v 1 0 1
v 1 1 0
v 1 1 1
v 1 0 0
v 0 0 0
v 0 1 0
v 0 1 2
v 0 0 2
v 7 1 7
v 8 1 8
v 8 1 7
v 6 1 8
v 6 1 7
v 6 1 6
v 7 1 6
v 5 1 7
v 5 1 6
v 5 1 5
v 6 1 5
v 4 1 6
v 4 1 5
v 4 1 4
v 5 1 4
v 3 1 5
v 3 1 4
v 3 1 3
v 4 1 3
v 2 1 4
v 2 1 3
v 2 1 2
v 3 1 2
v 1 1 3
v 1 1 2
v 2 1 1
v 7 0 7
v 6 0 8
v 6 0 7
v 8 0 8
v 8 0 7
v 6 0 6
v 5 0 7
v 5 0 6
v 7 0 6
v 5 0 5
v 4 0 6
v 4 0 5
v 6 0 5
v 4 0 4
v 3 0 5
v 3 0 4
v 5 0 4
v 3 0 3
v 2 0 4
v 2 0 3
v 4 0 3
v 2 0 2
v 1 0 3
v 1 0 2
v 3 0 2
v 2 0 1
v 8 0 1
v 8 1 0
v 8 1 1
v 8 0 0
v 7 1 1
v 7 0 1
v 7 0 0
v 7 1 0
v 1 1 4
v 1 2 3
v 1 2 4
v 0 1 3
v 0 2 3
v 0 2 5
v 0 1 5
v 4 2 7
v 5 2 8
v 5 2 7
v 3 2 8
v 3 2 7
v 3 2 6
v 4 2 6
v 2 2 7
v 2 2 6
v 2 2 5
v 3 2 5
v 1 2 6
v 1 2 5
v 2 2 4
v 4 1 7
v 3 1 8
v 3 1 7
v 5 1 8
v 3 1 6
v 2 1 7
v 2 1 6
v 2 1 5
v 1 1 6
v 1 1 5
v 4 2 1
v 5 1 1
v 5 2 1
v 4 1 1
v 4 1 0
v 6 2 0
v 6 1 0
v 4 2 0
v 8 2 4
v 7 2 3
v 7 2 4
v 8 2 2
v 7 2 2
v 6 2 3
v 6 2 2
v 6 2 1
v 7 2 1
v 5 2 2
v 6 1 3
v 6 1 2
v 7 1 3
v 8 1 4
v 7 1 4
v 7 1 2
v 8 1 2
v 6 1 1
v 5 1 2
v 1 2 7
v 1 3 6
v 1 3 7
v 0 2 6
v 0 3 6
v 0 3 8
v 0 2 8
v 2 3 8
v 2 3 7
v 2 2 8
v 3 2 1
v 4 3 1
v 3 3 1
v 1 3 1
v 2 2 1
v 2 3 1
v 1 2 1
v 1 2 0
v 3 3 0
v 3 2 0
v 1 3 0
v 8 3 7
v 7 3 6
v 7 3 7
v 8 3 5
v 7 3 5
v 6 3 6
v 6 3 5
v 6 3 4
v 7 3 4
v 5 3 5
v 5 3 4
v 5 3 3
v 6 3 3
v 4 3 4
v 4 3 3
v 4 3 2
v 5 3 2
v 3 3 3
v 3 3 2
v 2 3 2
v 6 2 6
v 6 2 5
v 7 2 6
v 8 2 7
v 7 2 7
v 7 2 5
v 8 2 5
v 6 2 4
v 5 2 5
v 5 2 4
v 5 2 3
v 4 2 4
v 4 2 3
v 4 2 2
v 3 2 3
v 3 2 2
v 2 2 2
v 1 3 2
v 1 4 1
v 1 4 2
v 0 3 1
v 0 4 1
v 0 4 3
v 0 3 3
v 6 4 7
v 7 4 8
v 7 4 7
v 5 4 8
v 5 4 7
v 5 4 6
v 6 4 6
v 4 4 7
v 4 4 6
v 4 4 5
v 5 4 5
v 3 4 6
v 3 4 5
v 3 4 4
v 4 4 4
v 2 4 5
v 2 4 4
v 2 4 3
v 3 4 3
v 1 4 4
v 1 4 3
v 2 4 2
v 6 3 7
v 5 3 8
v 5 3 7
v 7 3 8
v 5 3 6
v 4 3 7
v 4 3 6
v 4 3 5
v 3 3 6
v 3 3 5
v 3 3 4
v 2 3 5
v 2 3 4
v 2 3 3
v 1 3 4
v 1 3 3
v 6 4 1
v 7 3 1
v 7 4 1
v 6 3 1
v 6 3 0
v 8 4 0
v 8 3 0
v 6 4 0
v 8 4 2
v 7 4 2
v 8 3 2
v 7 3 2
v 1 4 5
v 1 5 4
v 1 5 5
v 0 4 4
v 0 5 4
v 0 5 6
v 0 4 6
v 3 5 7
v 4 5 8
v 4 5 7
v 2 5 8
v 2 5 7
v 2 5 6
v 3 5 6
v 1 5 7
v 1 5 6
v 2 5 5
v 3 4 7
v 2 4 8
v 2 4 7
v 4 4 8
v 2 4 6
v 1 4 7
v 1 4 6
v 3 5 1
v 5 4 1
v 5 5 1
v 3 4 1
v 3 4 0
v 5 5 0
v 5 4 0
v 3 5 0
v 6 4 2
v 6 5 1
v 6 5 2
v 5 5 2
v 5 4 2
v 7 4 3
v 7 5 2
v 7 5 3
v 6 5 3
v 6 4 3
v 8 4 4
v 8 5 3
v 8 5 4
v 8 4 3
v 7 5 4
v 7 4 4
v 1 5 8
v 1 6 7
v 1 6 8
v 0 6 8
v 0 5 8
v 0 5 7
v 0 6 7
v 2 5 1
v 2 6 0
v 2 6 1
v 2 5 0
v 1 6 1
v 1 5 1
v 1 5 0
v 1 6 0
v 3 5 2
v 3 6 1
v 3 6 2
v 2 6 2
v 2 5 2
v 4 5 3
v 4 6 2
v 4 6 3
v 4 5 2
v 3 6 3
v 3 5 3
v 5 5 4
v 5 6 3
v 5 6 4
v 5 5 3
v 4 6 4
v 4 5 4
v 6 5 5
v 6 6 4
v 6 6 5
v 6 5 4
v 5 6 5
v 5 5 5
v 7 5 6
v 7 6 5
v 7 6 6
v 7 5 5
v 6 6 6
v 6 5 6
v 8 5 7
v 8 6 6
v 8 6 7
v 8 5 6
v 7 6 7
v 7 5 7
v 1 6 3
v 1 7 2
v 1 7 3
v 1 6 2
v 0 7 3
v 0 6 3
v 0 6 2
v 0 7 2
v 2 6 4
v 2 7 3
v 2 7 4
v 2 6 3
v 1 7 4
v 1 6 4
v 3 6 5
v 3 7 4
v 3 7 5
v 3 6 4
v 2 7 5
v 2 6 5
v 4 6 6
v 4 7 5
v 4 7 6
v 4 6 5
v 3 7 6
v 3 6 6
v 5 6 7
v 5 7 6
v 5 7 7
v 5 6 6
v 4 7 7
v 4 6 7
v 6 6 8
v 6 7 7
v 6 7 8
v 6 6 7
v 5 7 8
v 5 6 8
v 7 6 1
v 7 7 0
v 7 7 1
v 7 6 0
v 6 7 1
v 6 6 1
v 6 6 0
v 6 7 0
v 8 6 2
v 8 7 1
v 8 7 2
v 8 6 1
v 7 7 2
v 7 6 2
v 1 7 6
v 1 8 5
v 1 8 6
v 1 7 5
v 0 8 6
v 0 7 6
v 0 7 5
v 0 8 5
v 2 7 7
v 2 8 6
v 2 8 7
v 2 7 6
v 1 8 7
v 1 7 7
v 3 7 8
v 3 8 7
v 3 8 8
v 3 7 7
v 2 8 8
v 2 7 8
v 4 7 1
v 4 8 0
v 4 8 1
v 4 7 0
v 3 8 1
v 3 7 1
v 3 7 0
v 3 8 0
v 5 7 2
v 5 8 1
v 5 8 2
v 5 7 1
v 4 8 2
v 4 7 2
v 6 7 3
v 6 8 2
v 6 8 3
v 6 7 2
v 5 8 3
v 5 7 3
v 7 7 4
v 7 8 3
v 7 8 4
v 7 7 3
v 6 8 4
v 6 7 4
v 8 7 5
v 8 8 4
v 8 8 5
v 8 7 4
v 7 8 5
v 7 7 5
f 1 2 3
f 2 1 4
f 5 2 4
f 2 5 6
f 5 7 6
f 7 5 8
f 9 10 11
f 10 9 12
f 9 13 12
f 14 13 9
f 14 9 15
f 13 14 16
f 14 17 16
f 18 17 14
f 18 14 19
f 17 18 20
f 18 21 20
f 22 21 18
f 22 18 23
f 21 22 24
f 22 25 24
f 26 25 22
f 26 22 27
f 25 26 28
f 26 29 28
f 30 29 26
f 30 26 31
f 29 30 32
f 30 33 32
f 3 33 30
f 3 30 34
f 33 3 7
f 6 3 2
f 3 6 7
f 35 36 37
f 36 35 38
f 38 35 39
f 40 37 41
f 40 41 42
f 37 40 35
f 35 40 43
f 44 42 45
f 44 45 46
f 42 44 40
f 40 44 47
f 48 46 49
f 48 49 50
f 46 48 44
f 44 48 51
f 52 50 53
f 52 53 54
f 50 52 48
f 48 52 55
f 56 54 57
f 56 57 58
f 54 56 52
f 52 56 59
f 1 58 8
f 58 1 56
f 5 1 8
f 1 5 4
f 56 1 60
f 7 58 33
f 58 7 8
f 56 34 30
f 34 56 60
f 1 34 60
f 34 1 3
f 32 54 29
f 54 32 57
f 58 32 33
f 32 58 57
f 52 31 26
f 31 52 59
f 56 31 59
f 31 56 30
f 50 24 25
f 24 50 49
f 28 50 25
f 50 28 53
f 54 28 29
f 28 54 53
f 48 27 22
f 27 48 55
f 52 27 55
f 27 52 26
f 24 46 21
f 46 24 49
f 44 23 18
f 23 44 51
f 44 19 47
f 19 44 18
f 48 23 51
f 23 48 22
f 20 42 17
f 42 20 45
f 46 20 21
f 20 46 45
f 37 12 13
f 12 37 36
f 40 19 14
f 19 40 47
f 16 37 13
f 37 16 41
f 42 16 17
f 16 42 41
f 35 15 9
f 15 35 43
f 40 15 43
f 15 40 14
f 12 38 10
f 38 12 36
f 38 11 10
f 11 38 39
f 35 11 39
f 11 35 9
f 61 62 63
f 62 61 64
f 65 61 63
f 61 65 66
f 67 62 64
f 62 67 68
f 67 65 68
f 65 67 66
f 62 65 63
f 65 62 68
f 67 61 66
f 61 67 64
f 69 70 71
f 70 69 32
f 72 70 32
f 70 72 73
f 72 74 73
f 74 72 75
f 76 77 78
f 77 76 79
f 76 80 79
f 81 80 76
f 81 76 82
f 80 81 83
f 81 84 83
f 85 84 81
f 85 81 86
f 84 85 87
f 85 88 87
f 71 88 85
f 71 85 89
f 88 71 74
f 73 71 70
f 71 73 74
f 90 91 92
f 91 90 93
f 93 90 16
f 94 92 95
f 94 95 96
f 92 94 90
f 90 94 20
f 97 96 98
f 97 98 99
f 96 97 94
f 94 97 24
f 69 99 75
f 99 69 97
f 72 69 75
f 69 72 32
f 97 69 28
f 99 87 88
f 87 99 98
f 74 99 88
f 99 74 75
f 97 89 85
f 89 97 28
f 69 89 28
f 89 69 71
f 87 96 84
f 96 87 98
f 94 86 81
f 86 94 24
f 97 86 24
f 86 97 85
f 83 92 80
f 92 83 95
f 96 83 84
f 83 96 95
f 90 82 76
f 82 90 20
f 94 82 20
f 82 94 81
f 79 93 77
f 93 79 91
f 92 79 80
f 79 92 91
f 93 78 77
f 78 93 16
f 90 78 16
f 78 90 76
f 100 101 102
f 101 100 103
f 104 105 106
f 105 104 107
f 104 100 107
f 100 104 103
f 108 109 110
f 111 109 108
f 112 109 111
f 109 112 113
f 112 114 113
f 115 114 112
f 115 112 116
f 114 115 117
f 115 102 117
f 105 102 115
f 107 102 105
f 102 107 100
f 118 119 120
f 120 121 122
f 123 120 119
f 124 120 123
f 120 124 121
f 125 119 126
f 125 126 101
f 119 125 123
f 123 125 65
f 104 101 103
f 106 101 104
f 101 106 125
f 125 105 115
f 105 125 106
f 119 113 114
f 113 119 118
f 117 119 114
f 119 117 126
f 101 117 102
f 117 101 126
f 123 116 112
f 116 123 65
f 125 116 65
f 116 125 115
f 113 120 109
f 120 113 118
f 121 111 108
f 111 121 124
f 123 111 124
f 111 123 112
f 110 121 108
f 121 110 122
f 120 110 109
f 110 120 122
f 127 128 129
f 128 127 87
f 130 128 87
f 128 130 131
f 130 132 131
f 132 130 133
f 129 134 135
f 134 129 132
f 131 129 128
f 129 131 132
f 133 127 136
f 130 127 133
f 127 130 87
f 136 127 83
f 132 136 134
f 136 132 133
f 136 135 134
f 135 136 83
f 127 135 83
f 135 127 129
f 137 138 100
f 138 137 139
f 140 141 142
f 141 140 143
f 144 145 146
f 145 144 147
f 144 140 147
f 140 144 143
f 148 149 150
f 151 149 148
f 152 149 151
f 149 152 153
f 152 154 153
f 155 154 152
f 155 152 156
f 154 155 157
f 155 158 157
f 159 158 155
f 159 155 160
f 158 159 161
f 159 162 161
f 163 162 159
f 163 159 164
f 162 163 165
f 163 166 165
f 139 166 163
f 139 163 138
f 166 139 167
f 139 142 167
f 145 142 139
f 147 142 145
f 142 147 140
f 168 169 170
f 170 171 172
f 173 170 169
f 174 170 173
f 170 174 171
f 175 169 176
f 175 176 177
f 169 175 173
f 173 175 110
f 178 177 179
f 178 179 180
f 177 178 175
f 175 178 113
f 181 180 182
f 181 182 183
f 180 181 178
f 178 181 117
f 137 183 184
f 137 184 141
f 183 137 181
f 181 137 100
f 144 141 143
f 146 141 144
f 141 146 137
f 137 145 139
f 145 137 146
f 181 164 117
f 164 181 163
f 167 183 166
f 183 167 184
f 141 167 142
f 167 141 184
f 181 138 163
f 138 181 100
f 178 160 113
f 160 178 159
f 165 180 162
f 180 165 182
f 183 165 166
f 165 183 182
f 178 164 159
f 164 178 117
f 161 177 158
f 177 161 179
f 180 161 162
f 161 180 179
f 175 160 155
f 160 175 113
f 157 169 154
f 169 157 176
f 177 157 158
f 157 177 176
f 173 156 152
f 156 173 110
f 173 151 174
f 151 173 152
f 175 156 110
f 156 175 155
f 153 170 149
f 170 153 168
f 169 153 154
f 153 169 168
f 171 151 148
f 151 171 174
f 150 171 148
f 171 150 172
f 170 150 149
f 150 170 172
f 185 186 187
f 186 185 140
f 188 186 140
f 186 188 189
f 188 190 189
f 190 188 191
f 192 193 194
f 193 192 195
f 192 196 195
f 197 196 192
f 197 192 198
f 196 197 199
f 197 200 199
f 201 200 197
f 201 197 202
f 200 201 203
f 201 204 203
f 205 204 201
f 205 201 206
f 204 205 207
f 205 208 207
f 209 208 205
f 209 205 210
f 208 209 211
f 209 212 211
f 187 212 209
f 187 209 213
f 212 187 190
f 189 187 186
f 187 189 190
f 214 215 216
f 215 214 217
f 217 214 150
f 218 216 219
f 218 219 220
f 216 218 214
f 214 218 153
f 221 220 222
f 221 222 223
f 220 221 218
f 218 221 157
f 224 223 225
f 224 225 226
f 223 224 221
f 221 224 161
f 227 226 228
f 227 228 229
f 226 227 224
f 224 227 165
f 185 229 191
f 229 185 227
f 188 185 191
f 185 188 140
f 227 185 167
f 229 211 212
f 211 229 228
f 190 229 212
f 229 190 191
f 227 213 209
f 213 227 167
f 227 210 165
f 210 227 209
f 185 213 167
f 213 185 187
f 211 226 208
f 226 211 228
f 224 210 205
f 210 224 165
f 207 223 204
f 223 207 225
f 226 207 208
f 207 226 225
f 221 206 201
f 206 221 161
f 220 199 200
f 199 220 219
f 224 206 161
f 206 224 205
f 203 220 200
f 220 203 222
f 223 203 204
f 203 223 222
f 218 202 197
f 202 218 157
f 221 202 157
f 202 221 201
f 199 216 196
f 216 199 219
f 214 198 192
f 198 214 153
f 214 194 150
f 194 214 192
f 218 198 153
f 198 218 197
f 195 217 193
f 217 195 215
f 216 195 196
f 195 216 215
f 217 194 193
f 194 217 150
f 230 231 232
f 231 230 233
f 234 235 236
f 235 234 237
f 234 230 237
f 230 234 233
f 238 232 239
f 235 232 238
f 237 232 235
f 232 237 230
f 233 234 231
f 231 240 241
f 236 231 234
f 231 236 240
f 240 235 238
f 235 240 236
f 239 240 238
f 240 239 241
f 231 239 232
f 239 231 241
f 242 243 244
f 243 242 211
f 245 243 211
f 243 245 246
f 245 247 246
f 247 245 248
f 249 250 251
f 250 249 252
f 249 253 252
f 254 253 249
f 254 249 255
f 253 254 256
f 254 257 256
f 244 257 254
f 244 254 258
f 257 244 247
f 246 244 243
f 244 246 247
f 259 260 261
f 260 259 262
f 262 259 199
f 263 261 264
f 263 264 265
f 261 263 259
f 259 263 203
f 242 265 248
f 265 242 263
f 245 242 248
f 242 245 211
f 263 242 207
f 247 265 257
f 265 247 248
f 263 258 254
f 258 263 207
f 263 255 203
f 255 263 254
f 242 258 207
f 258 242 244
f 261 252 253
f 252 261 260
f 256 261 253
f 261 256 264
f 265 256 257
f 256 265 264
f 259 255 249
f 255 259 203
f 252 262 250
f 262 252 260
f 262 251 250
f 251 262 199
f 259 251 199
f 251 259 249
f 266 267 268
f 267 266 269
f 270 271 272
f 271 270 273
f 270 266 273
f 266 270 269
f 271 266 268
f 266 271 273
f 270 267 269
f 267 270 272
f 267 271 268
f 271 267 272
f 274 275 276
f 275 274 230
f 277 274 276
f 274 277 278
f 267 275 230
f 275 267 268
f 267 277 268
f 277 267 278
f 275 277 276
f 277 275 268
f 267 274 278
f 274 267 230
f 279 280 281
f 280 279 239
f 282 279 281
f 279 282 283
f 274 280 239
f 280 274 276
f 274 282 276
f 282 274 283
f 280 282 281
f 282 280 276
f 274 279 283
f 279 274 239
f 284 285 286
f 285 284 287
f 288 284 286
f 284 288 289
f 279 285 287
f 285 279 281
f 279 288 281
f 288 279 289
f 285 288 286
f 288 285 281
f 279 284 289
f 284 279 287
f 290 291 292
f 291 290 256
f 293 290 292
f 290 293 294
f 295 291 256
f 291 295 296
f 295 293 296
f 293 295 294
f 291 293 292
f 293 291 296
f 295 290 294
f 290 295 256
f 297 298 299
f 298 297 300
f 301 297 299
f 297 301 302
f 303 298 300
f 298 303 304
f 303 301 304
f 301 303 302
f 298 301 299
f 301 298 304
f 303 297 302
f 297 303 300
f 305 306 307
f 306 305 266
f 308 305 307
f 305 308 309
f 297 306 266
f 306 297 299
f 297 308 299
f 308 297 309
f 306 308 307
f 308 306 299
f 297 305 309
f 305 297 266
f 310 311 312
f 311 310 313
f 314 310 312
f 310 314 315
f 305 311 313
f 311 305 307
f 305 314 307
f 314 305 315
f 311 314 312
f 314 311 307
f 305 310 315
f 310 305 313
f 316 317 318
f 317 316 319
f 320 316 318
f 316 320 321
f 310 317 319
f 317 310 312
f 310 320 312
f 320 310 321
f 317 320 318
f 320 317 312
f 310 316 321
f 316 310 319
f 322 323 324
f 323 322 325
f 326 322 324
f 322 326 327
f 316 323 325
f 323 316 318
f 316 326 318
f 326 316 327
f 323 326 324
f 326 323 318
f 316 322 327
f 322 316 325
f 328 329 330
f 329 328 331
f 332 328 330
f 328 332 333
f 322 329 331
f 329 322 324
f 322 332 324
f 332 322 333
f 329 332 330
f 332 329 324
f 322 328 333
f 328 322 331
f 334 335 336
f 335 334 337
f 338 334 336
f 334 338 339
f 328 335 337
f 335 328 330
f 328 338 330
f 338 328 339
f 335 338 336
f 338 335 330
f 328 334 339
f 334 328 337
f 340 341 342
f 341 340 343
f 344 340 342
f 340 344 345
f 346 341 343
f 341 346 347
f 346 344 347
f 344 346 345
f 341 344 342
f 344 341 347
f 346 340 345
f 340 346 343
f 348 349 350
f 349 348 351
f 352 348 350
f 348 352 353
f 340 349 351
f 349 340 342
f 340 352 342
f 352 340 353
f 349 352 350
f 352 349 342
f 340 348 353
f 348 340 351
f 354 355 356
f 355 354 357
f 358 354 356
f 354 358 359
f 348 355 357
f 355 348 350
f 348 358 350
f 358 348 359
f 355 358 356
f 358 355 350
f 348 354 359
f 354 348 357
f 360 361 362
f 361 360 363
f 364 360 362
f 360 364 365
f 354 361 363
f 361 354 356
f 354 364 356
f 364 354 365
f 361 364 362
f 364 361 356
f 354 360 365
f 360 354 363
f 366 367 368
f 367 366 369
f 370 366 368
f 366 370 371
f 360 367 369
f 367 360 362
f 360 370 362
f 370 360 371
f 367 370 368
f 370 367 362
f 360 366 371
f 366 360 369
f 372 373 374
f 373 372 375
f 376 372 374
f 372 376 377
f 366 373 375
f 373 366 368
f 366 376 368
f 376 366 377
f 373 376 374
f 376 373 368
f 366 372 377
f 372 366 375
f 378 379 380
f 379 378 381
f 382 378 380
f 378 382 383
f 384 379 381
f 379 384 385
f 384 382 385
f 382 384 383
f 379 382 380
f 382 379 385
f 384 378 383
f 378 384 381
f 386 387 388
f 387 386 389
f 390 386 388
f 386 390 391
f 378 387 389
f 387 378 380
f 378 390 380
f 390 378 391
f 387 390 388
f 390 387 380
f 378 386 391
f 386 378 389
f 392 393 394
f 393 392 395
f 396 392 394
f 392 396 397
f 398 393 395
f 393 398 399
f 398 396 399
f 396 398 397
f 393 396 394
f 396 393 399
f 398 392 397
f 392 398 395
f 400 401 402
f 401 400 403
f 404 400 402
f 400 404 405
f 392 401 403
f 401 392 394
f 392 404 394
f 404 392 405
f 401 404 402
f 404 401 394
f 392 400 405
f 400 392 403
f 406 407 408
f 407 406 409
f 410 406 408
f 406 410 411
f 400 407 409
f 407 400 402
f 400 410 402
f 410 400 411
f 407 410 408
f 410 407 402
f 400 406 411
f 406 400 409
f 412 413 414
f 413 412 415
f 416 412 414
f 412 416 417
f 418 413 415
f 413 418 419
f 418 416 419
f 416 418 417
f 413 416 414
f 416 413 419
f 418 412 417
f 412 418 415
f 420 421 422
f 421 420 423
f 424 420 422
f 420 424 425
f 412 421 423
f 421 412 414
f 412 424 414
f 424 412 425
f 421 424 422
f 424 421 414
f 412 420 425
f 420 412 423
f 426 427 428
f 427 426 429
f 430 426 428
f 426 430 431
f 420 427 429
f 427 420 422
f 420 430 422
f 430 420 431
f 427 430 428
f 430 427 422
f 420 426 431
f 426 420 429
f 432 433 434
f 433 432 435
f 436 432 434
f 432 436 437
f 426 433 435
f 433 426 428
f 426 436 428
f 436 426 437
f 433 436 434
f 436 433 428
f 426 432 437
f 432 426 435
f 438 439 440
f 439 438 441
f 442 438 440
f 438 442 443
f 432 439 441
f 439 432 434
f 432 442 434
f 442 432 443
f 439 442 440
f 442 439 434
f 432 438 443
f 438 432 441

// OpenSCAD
union() {
    translate([0, 0, 0]) cube([1, 1, 1]);
    translate([0, 0, 1]) cube([1, 1, 1]);
    translate([1, 0, 1]) cube([1, 1, 1]);
    translate([1, 0, 2]) cube([1, 1, 1]);
    translate([2, 0, 2]) cube([1, 1, 1]);
    translate([2, 0, 3]) cube([1, 1, 1]);
    translate([3, 0, 3]) cube([1, 1, 1]);
    translate([3, 0, 4]) cube([1, 1, 1]);
    translate([4, 0, 4]) cube([1, 1, 1]);
    translate([4, 0, 5]) cube([1, 1, 1]);
    translate([5, 0, 5]) cube([1, 1, 1]);
    translate([5, 0, 6]) cube([1, 1, 1]);
    translate([6, 0, 6]) cube([1, 1, 1]);
    translate([6, 0, 7]) cube([1, 1, 1]);
    translate([7, 0, 7]) cube([1, 1, 1]);
    translate([7, 0, 0]) cube([1, 1, 1]);
    translate([0, 1, 3]) cube([1, 1, 1]);
    translate([0, 1, 4]) cube([1, 1, 1]);
    translate([1, 1, 4]) cube([1, 1, 1]);
    translate([1, 1, 5]) cube([1, 1, 1]);
    translate([2, 1, 5]) cube([1, 1, 1]);
    translate([2, 1, 6]) cube([1, 1, 1]);
    translate([3, 1, 6]) cube([1, 1, 1]);
    translate([3, 1, 7]) cube([1, 1, 1]);
    translate([4, 1, 7]) cube([1, 1, 1]);
    translate([4, 1, 0]) cube([1, 1, 1]);
    translate([5, 1, 0]) cube([1, 1, 1]);
    translate([5, 1, 1]) cube([1, 1, 1]);
    translate([6, 1, 1]) cube([1, 1, 1]);
    translate([6, 1, 2]) cube([1, 1, 1]);
    translate([7, 1, 2]) cube([1, 1, 1]);
    translate([7, 1, 3]) cube([1, 1, 1]);
    translate([0, 2, 6]) cube([1, 1, 1]);
    translate([0, 2, 7]) cube([1, 1, 1]);
    translate([1, 2, 7]) cube([1, 1, 1]);
    translate([1, 2, 0]) cube([1, 1, 1]);
    translate([2, 2, 0]) cube([1, 1, 1]);
    translate([2, 2, 1]) cube([1, 1, 1]);
    translate([3, 2, 1]) cube([1, 1, 1]);
    translate([3, 2, 2]) cube([1, 1, 1]);
    translate([4, 2, 2]) cube([1, 1, 1]);
    translate([4, 2, 3]) cube([1, 1, 1]);
    translate([5, 2, 3]) cube([1, 1, 1]);
    translate([5, 2, 4]) cube([1, 1, 1]);
    translate([6, 2, 4]) cube([1, 1, 1]);
    translate([6, 2, 5]) cube([1, 1, 1]);
    translate([7, 2, 5]) cube([1, 1, 1]);
    translate([7, 2, 6]) cube([1, 1, 1]);
    translate([0, 3, 1]) cube([1, 1, 1]);
    translate([0, 3, 2]) cube([1, 1, 1]);
    translate([1, 3, 2]) cube([1, 1, 1]);
    translate([1, 3, 3]) cube([1, 1, 1]);
    translate([2, 3, 3]) cube([1, 1, 1]);
    translate([2, 3, 4]) cube([1, 1, 1]);
    translate([3, 3, 4]) cube([1, 1, 1]);
    translate([3, 3, 5]) cube([1, 1, 1]);
    translate([4, 3, 5]) cube([1, 1, 1]);
    translate([4, 3, 6]) cube([1, 1, 1]);
    translate([5, 3, 6]) cube([1, 1, 1]);
    translate([5, 3, 7]) cube([1, 1, 1]);
    translate([6, 3, 7]) cube([1, 1, 1]);
    translate([6, 3, 0]) cube([1, 1, 1]);
    translate([7, 3, 0]) cube([1, 1, 1]);
    translate([7, 3, 1]) cube([1, 1, 1]);
    translate([0, 4, 4]) cube([1, 1, 1]);
    translate([0, 4, 5]) cube([1, 1, 1]);
    translate([1, 4, 5]) cube([1, 1, 1]);
    translate([1, 4, 6]) cube([1, 1, 1]);
    translate([2, 4, 6]) cube([1, 1, 1]);
    translate([2, 4, 7]) cube([1, 1, 1]);
    translate([3, 4, 7]) cube([1, 1, 1]);
    translate([3, 4, 0]) cube([1, 1, 1]);
    translate([4, 4, 0]) cube([1, 1, 1]);
    translate([5, 4, 1]) cube([1, 1, 1]);
    translate([6, 4, 2]) cube([1, 1, 1]);
    translate([7, 4, 3]) cube([1, 1, 1]);
    translate([0, 5, 7]) cube([1, 1, 1]);
    translate([1, 5, 0]) cube([1, 1, 1]);
    translate([2, 5, 1]) cube([1, 1, 1]);
    translate([3, 5, 2]) cube([1, 1, 1]);
    translate([4, 5, 3]) cube([1, 1, 1]);
    translate([5, 5, 4]) cube([1, 1, 1]);
    translate([6, 5, 5]) cube([1, 1, 1]);
    translate([7, 5, 6]) cube([1, 1, 1]);
    translate([0, 6, 2]) cube([1, 1, 1]);
    translate([1, 6, 3]) cube([1, 1, 1]);
    translate([2, 6, 4]) cube([1, 1, 1]);
    translate([3, 6, 5]) cube([1, 1, 1]);
    translate([4, 6, 6]) cube([1, 1, 1]);
    translate([5, 6, 7]) cube([1, 1, 1]);
    translate([6, 6, 0]) cube([1, 1, 1]);
    translate([7, 6, 1]) cube([1, 1, 1]);
    translate([0, 7, 5]) cube([1, 1, 1]);
    translate([1, 7, 6]) cube([1, 1, 1]);
    translate([2, 7, 7]) cube([1, 1, 1]);
    translate([3, 7, 0]) cube([1, 1, 1]);
    translate([4, 7, 1]) cube([1, 1, 1]);
    translate([5, 7, 2]) cube([1, 1, 1]);
    translate([6, 7, 3]) cube([1, 1, 1]);
    translate([7, 7, 4]) cube([1, 1, 1]);
}
